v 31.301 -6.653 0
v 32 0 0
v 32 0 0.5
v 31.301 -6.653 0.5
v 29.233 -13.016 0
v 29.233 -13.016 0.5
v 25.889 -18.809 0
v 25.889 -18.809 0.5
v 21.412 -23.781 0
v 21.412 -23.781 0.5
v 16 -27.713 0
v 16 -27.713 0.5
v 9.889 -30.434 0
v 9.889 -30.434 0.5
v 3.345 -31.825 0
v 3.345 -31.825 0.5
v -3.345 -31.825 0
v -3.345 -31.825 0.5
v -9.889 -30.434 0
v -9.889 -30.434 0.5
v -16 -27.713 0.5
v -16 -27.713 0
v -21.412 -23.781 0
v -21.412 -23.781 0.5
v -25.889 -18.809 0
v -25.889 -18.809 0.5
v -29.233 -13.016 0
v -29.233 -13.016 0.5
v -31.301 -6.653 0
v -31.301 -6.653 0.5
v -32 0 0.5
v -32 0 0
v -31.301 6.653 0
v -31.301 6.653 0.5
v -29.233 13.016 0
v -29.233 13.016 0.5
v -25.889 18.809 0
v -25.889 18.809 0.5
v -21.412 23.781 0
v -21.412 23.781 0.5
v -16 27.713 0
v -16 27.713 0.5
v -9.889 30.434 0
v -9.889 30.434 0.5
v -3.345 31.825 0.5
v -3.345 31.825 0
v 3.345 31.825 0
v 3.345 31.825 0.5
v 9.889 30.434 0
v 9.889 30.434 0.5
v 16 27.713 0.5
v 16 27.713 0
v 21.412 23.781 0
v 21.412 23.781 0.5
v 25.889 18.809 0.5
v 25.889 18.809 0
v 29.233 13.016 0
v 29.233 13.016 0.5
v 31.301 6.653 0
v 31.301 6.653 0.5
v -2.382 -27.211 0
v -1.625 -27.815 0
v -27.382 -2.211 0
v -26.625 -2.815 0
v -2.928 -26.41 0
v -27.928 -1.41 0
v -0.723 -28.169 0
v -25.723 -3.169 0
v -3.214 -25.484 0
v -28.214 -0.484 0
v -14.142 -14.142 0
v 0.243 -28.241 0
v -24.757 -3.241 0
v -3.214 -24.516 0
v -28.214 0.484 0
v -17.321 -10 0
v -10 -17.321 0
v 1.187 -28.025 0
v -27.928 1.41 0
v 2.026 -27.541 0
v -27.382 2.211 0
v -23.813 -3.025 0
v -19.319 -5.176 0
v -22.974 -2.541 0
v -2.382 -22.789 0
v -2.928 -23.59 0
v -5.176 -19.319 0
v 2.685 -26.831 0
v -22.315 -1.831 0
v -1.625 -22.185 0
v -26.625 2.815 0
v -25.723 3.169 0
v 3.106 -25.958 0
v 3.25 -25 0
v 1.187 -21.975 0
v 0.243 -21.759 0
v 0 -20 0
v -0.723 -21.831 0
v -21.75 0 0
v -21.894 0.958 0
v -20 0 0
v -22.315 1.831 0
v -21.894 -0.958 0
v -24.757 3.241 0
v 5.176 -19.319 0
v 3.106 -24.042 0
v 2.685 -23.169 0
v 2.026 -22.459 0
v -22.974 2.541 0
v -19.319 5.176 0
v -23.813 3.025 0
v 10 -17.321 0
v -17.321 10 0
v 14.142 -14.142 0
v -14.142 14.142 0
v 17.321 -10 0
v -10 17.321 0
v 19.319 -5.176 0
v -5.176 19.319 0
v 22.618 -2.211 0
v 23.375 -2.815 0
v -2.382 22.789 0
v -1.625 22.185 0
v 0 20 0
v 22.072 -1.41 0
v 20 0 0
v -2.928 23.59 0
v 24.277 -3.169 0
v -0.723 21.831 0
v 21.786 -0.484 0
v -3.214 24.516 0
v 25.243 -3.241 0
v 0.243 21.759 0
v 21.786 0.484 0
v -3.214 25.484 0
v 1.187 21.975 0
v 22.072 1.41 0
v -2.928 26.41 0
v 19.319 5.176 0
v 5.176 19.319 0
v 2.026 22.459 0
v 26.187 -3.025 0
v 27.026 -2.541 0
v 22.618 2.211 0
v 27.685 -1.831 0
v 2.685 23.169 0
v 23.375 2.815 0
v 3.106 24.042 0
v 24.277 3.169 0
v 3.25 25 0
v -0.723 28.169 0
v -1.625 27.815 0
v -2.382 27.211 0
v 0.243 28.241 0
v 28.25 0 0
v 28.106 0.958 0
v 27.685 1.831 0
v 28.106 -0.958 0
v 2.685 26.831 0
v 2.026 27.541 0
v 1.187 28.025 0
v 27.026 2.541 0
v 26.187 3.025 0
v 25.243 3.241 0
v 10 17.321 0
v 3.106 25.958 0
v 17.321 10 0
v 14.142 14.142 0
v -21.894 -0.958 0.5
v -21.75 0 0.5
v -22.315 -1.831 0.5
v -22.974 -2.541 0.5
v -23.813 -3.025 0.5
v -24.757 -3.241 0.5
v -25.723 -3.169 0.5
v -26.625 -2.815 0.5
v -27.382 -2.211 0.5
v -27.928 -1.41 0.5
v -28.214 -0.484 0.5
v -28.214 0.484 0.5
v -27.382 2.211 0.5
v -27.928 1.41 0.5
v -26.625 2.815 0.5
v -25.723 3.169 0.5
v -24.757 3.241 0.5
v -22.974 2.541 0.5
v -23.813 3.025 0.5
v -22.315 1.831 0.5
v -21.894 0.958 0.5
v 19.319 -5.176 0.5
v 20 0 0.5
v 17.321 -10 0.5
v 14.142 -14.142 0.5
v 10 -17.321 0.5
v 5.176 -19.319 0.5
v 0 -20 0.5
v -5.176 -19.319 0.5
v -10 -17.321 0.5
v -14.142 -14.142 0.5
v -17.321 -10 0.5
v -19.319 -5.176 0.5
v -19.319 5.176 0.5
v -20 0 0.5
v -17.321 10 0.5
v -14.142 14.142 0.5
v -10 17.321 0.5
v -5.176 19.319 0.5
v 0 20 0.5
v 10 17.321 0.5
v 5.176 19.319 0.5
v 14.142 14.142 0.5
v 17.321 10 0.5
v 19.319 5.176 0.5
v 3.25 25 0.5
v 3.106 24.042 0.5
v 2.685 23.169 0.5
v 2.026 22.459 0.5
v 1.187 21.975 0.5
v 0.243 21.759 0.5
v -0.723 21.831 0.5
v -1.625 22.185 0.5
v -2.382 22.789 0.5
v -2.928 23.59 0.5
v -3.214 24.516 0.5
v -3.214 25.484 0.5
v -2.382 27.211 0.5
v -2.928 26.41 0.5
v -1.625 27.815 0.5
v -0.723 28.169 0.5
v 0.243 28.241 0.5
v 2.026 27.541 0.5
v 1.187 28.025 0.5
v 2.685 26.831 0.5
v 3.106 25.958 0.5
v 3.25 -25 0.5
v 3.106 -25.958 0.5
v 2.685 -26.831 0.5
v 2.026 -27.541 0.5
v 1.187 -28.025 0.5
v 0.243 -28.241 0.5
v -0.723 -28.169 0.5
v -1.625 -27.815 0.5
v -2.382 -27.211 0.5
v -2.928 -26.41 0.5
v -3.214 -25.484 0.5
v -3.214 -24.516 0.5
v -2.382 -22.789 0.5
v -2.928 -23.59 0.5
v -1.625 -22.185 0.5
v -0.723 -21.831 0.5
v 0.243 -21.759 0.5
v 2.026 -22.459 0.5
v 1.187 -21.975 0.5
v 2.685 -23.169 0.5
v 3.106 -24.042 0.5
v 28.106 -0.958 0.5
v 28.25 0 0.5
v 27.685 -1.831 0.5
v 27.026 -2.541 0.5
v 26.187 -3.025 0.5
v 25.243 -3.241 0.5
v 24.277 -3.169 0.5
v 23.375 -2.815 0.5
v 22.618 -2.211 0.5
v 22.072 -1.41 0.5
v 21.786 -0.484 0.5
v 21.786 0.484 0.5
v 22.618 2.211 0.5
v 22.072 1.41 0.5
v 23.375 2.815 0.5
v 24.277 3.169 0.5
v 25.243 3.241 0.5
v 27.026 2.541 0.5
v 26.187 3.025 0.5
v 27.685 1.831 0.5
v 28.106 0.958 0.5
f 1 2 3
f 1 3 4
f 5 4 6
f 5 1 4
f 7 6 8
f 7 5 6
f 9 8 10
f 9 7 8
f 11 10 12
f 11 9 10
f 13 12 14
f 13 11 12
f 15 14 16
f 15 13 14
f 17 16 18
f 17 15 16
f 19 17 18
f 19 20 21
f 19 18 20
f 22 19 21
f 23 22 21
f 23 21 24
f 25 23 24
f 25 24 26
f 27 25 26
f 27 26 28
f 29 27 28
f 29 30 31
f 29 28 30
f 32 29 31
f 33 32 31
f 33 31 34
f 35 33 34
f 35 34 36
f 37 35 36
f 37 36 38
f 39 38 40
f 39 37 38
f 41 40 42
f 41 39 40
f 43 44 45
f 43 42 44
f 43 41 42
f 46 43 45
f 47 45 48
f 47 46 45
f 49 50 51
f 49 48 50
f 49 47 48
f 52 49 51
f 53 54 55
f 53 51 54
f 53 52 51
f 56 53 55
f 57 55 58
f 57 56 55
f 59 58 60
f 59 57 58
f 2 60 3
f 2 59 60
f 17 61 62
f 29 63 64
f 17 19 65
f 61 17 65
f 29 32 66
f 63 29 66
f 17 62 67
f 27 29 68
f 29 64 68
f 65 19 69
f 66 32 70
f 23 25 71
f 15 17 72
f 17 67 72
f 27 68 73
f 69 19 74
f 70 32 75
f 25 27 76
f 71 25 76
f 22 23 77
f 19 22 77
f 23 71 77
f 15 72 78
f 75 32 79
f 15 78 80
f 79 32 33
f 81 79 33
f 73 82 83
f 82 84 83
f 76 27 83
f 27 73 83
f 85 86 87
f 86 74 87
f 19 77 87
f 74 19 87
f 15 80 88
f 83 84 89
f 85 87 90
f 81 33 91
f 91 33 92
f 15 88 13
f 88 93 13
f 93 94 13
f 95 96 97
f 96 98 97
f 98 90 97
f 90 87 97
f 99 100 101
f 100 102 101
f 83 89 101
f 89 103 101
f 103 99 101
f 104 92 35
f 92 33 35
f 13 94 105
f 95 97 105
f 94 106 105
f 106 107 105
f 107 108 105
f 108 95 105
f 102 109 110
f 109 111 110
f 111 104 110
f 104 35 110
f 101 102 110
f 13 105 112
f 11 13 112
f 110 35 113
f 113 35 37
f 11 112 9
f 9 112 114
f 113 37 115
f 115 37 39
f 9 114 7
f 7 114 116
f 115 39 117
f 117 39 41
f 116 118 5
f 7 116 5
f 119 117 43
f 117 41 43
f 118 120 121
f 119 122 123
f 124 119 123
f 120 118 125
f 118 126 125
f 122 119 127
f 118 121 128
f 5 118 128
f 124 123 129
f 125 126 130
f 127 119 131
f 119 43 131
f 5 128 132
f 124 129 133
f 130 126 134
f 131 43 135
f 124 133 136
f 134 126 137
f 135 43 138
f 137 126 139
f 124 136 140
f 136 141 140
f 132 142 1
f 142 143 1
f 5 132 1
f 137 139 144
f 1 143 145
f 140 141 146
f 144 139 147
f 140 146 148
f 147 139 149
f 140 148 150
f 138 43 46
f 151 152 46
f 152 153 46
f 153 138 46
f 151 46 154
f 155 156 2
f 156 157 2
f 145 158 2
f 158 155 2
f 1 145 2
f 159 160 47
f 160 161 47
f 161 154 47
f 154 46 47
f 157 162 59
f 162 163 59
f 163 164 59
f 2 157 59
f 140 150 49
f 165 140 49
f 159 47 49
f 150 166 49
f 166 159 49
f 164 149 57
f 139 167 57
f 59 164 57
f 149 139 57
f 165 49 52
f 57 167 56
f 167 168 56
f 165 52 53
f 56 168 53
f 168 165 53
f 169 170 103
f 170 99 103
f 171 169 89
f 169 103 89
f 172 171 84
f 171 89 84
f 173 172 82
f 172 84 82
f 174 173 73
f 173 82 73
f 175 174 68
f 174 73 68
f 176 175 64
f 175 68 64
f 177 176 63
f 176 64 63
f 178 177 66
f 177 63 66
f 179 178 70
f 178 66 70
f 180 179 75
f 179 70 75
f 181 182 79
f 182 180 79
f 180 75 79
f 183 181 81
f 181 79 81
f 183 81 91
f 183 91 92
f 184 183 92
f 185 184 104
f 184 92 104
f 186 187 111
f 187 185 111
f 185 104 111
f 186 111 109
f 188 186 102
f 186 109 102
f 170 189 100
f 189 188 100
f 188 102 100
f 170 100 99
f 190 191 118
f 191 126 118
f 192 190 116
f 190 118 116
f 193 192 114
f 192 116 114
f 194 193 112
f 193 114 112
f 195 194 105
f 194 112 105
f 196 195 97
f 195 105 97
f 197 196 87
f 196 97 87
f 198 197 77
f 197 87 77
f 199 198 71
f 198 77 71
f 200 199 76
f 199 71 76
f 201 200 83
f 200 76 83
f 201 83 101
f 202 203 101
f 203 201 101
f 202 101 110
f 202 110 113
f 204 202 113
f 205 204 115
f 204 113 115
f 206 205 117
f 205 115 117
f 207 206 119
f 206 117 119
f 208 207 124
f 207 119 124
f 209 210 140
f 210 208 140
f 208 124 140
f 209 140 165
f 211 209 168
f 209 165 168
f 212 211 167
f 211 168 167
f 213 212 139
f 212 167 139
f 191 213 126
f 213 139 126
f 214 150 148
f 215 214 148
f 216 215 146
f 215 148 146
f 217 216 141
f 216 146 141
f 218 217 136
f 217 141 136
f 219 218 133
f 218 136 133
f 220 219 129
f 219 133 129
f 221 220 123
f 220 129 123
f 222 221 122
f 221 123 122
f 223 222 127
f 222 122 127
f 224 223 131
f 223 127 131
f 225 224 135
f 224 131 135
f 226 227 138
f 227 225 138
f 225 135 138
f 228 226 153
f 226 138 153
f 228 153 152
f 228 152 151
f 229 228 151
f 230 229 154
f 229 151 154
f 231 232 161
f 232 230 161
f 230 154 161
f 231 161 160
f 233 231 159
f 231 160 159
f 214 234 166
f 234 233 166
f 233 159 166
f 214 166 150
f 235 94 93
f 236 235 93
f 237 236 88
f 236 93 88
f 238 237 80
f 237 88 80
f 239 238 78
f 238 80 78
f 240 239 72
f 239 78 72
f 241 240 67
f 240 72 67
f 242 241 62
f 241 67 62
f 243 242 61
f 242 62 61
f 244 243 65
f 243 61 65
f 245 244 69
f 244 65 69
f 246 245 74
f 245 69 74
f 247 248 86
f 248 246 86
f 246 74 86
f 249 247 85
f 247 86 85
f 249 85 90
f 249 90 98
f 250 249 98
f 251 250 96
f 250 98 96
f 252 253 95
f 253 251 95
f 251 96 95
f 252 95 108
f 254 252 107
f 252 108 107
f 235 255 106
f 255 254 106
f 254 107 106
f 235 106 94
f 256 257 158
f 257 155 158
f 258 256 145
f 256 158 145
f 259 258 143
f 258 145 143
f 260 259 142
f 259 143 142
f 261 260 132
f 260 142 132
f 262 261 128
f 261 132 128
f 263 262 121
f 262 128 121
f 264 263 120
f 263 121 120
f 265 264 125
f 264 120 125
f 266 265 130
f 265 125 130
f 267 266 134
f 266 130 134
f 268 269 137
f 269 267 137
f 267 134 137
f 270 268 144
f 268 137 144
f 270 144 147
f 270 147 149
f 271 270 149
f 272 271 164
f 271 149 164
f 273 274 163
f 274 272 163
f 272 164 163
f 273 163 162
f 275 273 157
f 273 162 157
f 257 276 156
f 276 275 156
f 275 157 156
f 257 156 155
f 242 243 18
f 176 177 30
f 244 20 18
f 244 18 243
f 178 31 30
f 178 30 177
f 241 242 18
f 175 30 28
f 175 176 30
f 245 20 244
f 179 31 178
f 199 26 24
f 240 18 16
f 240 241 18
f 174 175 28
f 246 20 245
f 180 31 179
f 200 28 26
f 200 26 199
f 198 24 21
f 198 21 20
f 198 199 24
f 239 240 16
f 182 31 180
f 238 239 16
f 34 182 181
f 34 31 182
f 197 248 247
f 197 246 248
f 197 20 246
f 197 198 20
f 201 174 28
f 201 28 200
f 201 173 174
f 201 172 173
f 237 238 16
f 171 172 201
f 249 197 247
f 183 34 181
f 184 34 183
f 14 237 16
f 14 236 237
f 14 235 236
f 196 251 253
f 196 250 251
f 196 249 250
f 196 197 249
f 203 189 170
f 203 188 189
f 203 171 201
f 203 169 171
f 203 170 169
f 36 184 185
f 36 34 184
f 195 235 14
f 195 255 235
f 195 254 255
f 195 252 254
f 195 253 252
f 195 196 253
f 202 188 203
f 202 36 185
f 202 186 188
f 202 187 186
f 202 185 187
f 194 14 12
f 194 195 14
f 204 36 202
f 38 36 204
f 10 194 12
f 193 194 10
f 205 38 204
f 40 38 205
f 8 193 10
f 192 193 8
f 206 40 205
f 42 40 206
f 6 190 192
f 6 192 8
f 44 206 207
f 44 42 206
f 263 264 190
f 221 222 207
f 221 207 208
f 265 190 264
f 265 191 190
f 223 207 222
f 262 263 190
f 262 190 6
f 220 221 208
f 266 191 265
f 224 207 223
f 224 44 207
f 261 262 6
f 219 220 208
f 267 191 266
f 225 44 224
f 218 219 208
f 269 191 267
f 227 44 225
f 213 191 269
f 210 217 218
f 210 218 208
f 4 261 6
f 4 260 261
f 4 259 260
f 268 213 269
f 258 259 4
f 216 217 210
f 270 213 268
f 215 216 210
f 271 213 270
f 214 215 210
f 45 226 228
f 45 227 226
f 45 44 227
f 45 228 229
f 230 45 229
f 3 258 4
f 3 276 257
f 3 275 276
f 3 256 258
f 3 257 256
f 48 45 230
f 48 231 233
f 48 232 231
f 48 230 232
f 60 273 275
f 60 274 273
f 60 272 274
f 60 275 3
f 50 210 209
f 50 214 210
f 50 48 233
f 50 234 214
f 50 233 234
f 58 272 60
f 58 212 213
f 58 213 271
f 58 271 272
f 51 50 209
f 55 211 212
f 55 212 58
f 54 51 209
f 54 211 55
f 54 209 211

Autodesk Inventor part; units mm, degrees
ref_plane "YZ Plane" through (0, 0, 0) normal (1, 0, 0) x (0, 1, 0)
ref_plane "XZ Plane" through (0, 0, 0) normal (0, 1, 0) x (-1, 0, 0)
ref_plane "XY Plane" through (0, 0, 0) normal (0, 0, 1) x (1, 0, 0)
sketch "Sketch1" plane through (0, 0, 0) normal (0, 0, 1) x (1, 0, 0)
  circle A0 centre (0, 0) radius 20
  circle A1 centre (0, 0) radius 25 construction
  circle A2 centre (0, 0) radius 32
  circle A3 centre (0, 25) radius 3.25
  circle A4 centre (-25, 0) radius 3.25
  circle A5 centre (0, -25) radius 3.25
  circle A6 centre (25, 0) radius 3.25
  dimension "d1" = 50
  dimension "d0" = 40
  dimension "d2" = 64
  dimension "d3" = 6.5
  dimension "d6" = 360
extrude "Extrusion1" add sketch "Sketch1" along normal blind 0.5
properties part number "CylinderPacking"
